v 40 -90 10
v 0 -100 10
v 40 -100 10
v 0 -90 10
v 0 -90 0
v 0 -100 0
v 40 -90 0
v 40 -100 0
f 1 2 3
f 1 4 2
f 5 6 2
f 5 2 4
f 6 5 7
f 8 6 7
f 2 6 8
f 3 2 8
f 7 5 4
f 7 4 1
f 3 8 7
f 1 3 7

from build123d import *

# Parameters (mm, degrees)
BOX_W        = 10
BOX_H        = 10
BOX_DEPTH    = 10
BOX001_W     = 10
BOX001_H     = 10
BOX001_DEPTH = 10
BOX002_W     = 10
BOX002_H     = 10
BOX002_DEPTH = 10
BOX003_W     = 10
BOX003_H     = 10
BOX003_DEPTH = 10


with BuildPart() as cubo:
    # Box → Box (new body)
    with BuildSketch(Plane.XY):
        with Locations((5, 5)):
            Rectangle(BOX_W, BOX_H)
    extrude(amount=BOX_DEPTH)


with BuildPart() as cubo001:
    # Box001 → Box001 (new body)
    with BuildSketch(Plane(origin=(10, 0, 0), x_dir=(1, 0, 0), z_dir=(0, 0, 1))):
        with Locations((5, 5)):
            Rectangle(BOX001_W, BOX001_H)
    extrude(amount=BOX001_DEPTH)


with BuildPart() as cubo002:
    # Box002 → Box002 (new body)
    with BuildSketch(Plane(origin=(20, 0, 0), x_dir=(1, 0, 0), z_dir=(0, 0, 1))):
        with Locations((5, 5)):
            Rectangle(BOX002_W, BOX002_H)
    extrude(amount=BOX002_DEPTH)


with BuildPart() as fusion:
    # Box003 → Box003 (new body)
    with BuildSketch(Plane(origin=(30, 0, 0), x_dir=(1, 0, 0), z_dir=(0, 0, 1))):
        with Locations((5, 5)):
            Rectangle(BOX003_W, BOX003_H)
    extrude(amount=BOX003_DEPTH)

    # Fusion: union Cubo, Cubo001, Cubo002
    add(cubo.part)
    add(cubo001.part)
    add(cubo002.part)


with BuildPart() as fusion_1:
    # Fusion placement: moved
    add(fusion.part.moved(Location((0, -100, 0))))


solid = fusion_1.part
